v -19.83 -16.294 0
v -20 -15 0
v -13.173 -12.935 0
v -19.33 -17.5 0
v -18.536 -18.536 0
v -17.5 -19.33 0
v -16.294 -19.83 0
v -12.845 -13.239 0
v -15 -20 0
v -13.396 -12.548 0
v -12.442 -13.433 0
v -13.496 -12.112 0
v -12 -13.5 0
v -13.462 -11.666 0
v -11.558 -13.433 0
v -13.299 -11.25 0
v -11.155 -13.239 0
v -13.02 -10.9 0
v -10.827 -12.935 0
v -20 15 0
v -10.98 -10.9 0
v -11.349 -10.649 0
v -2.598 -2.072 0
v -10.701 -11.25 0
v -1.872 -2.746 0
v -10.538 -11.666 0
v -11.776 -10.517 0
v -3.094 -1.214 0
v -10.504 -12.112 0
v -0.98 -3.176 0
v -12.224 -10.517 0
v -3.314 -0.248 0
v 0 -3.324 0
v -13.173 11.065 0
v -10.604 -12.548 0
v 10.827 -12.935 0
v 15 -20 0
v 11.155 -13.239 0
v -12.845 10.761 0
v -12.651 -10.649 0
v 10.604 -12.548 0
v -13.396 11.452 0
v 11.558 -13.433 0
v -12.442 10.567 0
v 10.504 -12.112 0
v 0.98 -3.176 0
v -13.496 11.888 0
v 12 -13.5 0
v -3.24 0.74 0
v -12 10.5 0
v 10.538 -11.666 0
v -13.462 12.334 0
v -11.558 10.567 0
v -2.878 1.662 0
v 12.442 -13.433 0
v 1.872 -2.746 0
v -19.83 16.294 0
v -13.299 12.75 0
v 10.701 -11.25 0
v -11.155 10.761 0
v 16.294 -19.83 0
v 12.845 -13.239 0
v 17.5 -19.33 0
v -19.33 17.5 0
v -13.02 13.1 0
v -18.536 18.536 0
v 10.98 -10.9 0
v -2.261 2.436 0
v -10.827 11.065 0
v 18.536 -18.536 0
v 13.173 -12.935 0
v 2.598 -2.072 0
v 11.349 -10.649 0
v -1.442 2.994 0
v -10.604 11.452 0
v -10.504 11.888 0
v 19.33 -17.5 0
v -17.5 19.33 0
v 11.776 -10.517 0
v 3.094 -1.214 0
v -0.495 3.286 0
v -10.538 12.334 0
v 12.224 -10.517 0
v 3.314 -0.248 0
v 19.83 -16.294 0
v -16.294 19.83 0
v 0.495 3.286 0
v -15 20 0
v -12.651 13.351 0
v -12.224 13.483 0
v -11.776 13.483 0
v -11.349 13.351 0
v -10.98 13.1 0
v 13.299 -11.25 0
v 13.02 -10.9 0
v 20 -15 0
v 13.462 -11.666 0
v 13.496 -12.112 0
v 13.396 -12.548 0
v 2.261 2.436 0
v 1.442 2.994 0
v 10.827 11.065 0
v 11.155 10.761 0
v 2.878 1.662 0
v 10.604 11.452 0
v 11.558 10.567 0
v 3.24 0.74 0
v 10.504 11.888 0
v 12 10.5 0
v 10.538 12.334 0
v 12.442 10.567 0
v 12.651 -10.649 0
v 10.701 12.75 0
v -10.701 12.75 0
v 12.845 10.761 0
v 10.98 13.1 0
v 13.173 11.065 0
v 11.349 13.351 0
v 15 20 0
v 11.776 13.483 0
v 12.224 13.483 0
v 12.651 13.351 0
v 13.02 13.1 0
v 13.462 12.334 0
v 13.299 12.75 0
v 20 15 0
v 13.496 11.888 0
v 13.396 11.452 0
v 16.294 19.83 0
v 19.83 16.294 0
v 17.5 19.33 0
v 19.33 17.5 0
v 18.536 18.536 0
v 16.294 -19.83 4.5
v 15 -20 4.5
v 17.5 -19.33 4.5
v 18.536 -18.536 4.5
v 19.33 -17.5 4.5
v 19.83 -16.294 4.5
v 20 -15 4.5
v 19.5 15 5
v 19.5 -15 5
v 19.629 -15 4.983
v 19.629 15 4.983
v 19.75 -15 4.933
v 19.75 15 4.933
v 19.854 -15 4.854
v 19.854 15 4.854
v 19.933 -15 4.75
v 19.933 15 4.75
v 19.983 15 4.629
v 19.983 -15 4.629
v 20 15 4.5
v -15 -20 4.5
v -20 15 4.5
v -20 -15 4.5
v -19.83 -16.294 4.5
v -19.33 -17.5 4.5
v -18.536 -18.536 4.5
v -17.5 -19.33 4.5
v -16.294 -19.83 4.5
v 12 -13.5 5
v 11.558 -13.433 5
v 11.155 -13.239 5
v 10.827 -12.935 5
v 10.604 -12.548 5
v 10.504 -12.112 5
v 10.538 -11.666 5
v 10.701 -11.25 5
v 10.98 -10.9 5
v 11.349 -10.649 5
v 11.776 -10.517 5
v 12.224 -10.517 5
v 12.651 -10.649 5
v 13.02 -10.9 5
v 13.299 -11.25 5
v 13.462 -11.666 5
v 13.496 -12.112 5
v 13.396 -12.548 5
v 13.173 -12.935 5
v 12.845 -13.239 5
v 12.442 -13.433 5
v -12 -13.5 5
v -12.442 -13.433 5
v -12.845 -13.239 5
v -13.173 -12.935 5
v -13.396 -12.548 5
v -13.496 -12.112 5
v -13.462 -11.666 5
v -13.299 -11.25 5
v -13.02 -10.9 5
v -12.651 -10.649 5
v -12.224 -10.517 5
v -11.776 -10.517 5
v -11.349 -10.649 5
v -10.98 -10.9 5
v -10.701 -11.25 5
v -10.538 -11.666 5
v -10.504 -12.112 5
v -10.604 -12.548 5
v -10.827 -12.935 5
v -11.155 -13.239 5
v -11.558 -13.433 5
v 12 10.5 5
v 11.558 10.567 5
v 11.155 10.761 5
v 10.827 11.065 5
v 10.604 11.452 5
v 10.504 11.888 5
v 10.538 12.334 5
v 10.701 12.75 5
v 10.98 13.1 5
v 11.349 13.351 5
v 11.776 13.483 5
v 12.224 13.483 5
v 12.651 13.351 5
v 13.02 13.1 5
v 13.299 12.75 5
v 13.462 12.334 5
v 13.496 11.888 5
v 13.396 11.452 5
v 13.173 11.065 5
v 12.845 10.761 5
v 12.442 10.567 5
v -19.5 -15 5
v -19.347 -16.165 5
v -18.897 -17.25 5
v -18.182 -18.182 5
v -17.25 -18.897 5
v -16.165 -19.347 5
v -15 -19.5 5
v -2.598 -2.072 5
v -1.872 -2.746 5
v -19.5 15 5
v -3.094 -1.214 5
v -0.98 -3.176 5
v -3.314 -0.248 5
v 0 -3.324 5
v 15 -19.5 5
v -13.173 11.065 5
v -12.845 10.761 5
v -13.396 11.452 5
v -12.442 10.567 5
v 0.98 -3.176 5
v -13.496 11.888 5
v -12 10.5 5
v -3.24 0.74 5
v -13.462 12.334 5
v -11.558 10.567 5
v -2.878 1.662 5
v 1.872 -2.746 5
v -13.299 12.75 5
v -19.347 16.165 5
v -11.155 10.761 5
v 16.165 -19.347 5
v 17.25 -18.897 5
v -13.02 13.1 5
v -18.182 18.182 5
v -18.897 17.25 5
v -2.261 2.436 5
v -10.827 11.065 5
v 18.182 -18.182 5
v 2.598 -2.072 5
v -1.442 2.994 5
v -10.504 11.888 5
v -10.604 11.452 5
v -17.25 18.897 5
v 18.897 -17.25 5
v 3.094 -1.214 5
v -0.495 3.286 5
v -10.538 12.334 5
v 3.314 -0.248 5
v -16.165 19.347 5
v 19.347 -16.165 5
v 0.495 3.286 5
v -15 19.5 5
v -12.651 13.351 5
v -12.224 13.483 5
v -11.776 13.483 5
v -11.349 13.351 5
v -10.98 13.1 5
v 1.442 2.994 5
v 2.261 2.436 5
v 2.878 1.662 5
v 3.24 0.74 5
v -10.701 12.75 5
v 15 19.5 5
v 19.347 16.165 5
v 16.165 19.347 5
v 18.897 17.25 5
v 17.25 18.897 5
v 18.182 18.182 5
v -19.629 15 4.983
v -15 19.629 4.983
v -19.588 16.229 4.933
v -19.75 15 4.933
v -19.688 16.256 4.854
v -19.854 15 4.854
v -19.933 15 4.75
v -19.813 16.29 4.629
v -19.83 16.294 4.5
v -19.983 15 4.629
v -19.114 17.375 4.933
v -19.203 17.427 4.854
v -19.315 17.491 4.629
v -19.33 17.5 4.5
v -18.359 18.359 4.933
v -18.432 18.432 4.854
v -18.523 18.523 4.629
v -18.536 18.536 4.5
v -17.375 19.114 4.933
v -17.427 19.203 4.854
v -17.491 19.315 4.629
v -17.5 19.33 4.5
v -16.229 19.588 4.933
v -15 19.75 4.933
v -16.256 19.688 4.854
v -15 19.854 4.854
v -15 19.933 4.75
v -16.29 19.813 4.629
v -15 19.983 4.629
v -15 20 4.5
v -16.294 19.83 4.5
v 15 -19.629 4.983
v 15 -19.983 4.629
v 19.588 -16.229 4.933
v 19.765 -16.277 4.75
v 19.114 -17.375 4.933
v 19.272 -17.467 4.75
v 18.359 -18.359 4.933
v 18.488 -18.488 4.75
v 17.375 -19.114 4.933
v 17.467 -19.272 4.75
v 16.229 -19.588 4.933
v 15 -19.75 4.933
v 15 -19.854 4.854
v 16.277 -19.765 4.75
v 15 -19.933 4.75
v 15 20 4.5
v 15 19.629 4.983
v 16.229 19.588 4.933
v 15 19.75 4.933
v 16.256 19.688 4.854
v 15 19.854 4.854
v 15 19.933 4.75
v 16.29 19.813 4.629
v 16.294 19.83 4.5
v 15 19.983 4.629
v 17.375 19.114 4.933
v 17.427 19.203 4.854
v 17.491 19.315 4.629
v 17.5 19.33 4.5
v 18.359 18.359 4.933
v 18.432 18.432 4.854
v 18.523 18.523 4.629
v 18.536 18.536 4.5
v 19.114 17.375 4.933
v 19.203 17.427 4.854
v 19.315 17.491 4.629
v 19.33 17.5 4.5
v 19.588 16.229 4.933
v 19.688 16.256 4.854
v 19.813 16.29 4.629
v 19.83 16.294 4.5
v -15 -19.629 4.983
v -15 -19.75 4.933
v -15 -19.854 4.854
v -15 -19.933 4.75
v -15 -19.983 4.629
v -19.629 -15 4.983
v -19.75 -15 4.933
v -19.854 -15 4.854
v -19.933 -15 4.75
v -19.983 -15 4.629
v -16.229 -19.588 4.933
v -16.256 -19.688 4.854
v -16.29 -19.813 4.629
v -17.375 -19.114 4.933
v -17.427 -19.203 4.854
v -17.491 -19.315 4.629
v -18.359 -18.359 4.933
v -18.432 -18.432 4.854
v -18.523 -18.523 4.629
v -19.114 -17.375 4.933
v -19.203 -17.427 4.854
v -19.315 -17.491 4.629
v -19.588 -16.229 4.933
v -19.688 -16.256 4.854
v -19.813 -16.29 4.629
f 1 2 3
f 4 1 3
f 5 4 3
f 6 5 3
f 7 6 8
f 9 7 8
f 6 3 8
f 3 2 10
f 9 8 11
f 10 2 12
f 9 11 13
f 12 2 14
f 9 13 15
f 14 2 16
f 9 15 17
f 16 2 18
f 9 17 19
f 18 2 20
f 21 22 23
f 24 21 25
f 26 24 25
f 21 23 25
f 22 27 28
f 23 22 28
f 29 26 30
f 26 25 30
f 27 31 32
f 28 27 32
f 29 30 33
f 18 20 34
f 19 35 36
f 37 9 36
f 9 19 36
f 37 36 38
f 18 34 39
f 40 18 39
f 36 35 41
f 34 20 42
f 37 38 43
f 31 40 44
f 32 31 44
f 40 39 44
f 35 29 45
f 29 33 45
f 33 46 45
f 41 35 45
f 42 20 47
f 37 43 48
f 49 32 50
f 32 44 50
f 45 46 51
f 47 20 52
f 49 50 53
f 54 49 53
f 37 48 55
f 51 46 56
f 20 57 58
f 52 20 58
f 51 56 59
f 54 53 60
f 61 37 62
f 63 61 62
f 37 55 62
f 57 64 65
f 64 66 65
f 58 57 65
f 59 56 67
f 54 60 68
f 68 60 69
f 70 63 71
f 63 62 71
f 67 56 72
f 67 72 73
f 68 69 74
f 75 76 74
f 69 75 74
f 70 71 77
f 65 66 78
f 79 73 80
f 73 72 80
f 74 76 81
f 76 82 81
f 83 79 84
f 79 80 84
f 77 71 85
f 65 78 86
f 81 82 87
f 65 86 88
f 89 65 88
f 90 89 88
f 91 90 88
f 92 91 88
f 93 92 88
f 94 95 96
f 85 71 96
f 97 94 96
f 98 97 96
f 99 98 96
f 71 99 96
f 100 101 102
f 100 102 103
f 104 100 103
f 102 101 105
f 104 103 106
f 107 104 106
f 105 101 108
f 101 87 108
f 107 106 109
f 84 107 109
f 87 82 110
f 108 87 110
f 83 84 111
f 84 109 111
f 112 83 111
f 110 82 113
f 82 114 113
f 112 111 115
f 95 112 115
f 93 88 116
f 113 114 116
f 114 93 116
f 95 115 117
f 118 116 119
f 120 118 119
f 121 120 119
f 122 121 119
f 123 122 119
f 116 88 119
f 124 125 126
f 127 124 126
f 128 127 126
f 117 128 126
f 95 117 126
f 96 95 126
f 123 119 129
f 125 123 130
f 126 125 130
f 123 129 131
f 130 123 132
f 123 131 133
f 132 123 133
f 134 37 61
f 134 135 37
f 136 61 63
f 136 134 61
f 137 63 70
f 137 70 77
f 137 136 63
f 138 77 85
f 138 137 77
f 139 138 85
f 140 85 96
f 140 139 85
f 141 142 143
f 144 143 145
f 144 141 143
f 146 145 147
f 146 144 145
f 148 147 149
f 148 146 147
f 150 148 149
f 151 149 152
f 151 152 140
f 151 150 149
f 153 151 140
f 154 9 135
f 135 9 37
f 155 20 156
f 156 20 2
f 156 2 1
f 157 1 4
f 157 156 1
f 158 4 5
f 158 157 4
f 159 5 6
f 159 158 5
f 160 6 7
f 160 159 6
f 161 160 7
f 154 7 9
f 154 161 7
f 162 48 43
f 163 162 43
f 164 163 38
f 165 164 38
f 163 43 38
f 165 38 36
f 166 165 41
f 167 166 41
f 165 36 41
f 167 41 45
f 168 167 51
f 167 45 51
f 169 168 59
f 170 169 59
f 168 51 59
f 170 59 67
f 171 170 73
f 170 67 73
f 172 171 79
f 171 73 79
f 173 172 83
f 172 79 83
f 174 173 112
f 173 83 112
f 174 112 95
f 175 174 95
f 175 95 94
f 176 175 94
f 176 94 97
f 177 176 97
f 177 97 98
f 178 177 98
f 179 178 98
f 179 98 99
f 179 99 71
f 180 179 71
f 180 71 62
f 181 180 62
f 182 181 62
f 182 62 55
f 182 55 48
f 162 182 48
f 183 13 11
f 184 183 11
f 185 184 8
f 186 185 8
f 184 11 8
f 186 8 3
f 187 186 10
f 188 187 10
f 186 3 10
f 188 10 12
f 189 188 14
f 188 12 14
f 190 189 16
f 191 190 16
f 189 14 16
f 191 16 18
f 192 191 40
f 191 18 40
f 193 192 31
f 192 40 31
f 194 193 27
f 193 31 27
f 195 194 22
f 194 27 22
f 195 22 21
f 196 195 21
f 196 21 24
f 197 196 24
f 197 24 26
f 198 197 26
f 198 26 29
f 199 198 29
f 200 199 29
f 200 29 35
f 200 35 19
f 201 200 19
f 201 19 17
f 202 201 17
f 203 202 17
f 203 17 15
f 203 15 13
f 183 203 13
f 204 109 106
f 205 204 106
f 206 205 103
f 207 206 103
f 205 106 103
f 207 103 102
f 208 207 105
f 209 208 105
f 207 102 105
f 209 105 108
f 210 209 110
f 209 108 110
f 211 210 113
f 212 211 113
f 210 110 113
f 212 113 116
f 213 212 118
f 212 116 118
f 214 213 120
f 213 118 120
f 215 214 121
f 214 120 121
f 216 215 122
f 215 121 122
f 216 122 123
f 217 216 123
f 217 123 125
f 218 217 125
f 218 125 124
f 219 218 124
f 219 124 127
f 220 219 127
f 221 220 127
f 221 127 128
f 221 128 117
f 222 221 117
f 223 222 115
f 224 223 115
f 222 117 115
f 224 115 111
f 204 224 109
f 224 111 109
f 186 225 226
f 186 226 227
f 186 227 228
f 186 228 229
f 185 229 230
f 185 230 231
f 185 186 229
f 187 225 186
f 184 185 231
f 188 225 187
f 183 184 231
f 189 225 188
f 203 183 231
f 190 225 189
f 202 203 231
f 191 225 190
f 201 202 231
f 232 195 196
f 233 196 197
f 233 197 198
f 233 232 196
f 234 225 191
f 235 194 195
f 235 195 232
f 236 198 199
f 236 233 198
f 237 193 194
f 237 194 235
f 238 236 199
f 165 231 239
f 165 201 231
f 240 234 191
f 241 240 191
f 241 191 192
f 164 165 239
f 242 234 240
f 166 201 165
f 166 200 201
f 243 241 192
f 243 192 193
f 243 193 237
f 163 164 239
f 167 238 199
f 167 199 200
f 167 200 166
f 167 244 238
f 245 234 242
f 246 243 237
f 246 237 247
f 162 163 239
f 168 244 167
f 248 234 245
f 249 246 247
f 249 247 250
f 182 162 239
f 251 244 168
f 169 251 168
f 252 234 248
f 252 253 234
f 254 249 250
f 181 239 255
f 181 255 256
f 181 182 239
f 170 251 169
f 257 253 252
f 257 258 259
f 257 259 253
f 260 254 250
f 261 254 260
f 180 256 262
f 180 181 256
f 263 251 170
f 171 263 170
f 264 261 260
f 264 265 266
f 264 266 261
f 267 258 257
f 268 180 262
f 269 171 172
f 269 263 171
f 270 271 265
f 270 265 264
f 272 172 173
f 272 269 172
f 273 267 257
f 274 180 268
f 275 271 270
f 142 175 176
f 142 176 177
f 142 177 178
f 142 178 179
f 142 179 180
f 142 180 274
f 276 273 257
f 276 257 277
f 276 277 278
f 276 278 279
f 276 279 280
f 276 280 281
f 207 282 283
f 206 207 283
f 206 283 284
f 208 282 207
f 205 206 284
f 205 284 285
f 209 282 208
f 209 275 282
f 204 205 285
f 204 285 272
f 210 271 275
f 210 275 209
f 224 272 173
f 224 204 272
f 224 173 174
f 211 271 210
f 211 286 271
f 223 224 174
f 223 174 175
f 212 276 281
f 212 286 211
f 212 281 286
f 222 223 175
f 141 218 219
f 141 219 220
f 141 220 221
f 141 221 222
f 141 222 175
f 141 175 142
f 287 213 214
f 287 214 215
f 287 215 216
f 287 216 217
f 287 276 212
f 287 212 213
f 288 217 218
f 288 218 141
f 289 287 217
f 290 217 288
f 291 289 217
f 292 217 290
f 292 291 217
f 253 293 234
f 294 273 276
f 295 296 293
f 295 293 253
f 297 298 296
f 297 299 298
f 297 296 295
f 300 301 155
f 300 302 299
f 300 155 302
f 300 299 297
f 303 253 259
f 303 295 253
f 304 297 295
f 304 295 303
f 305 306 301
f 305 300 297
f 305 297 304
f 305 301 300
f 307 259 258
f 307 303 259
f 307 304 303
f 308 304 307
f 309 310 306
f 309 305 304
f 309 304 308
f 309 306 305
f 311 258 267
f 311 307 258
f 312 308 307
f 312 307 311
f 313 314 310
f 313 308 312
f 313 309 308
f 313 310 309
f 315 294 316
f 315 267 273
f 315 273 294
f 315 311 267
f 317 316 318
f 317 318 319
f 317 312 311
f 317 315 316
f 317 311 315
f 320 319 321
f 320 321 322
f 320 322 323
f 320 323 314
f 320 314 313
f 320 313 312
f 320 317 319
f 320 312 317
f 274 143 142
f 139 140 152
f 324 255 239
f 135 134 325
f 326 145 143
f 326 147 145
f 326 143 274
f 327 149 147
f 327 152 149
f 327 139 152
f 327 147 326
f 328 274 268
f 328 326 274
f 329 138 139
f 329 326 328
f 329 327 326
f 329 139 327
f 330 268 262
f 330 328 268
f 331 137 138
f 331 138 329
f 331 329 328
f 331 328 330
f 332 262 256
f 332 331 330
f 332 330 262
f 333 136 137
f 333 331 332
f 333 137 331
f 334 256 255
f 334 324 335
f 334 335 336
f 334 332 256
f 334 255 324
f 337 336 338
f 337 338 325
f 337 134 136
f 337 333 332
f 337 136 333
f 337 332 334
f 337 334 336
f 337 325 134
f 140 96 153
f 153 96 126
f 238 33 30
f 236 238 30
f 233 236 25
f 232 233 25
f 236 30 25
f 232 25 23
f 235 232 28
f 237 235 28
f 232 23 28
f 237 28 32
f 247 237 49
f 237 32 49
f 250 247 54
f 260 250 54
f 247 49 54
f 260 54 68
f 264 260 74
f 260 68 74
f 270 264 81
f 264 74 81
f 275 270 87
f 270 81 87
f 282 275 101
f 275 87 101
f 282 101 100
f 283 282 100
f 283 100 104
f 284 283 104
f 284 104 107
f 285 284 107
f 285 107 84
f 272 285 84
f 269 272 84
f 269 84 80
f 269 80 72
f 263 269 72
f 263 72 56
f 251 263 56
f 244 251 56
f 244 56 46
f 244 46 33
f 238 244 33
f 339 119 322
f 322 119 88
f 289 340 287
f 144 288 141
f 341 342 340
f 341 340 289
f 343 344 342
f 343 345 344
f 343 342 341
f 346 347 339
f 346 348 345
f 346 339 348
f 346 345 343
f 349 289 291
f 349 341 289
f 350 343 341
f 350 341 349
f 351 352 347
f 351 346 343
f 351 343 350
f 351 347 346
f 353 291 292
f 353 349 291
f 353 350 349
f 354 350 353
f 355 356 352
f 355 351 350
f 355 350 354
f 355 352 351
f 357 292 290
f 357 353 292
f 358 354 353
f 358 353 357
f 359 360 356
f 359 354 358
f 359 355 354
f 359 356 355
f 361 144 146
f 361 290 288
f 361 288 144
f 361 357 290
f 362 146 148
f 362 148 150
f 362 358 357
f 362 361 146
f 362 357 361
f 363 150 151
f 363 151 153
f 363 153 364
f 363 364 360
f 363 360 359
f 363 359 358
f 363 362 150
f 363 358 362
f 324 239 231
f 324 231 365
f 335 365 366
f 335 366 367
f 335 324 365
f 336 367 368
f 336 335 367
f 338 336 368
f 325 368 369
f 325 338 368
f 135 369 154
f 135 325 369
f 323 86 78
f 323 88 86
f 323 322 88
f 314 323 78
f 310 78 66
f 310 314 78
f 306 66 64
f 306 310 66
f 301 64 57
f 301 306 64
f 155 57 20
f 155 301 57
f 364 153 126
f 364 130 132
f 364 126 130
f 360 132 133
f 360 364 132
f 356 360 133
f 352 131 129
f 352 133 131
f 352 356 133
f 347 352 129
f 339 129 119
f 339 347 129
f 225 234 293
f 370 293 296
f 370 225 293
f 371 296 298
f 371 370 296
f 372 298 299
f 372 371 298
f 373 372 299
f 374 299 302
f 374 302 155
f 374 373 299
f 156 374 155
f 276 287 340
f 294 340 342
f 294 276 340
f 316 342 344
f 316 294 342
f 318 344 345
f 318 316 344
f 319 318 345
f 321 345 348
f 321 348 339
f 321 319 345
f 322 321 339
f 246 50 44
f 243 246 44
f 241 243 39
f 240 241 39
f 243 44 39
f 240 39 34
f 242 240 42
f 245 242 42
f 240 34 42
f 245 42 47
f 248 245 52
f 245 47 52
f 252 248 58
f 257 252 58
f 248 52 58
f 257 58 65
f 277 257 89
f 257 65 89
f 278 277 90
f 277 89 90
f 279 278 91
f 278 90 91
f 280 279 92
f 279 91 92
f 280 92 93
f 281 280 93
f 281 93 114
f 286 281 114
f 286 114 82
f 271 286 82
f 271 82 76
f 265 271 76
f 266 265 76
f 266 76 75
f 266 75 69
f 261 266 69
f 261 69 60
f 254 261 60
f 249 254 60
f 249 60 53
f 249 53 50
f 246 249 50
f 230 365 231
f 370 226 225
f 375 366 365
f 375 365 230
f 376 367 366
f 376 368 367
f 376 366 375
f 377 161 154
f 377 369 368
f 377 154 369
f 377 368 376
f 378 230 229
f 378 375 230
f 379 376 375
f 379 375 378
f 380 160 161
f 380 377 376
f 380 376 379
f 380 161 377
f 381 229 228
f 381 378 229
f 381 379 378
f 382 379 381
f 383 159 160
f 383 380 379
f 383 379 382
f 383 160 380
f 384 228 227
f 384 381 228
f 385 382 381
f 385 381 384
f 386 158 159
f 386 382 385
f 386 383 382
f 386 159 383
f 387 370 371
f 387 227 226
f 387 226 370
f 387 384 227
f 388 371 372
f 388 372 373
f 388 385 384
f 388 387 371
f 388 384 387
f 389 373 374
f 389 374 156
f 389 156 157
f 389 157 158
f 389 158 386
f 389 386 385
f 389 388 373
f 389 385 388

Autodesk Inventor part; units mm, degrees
ref_plane "YZ Plane" through (0, 0, 0) normal (1, 0, 0) x (0, 1, 0)
ref_plane "XZ Plane" through (0, 0, 0) normal (0, 1, 0) x (-1, 0, 0)
ref_plane "XY Plane" through (0, 0, 0) normal (0, 0, 1) x (1, 0, 0)
sketch "Sketch1" plane through (0, 0, 0) normal (0, 0, 1) x (1, 0, 0)
  line L0 (-20, -20) -> (20, -20)
  line L1 (20, -20) -> (20, 20)
  line L2 (20, 20) -> (-20, 20)
  line L3 (-20, 20) -> (-20, -20)
  line L4 (-20, -20) -> (20, 20) construction
  line L5 (20, -20) -> (-20, 20) construction
  point P0 (0, 0)
  dimension "d0" = 40
  dimension "d1" = 40
extrude "Extrusion1" add sketch "Sketch1" along normal blind 5
sketch "Sketch2" plane through (0, 0, 5) normal (0, 0, 1) x (1, 0, 0)
  point P0 (0, 0)
  point P1 (-12, 12)
  point P2 (12, 12)
  point P3 (12, -12)
  point P4 (-12, -12)
  point P5 (0, 0)
  dimension "d4" = 24
  dimension "d5" = 12
  dimension "d6" = 24
  dimension "d7" = 12
hole "Hole1" at (-12, 12, 5) at (12, 12, 5) at (12, -12, 5) at (-12, -12, 5) direction (0, 0, -1) diameter 3 depth 5
hole "Hole2" at (0, 0, 5) direction (0, 0, -1) diameter 6.647 depth 5 thread size "M8x1.25" class "6H" standard "ISO Metric profile"
fillet "Fillet1" radius 5 4 edges at (20, 20, 2.5) (20, -20, 2.5) (-20, -20, 2.5) (-20, 20, 2.5)
fillet "Fillet2" radius 0.5 8 edges at (18.5355, -18.5355, 5) (20, 0, 5) (18.5355, 18.5355, 5) (0, 20, 5) (-18.5355, 18.5355, 5) (-20, 0, 5) (-18.5355, -18.5355, 5) (0, -20, 5)
equation "\"d5\" = 0.5 * d4"
equation "\"d7\" = 0.5 * d6"
properties part number "27" material "Gold"
